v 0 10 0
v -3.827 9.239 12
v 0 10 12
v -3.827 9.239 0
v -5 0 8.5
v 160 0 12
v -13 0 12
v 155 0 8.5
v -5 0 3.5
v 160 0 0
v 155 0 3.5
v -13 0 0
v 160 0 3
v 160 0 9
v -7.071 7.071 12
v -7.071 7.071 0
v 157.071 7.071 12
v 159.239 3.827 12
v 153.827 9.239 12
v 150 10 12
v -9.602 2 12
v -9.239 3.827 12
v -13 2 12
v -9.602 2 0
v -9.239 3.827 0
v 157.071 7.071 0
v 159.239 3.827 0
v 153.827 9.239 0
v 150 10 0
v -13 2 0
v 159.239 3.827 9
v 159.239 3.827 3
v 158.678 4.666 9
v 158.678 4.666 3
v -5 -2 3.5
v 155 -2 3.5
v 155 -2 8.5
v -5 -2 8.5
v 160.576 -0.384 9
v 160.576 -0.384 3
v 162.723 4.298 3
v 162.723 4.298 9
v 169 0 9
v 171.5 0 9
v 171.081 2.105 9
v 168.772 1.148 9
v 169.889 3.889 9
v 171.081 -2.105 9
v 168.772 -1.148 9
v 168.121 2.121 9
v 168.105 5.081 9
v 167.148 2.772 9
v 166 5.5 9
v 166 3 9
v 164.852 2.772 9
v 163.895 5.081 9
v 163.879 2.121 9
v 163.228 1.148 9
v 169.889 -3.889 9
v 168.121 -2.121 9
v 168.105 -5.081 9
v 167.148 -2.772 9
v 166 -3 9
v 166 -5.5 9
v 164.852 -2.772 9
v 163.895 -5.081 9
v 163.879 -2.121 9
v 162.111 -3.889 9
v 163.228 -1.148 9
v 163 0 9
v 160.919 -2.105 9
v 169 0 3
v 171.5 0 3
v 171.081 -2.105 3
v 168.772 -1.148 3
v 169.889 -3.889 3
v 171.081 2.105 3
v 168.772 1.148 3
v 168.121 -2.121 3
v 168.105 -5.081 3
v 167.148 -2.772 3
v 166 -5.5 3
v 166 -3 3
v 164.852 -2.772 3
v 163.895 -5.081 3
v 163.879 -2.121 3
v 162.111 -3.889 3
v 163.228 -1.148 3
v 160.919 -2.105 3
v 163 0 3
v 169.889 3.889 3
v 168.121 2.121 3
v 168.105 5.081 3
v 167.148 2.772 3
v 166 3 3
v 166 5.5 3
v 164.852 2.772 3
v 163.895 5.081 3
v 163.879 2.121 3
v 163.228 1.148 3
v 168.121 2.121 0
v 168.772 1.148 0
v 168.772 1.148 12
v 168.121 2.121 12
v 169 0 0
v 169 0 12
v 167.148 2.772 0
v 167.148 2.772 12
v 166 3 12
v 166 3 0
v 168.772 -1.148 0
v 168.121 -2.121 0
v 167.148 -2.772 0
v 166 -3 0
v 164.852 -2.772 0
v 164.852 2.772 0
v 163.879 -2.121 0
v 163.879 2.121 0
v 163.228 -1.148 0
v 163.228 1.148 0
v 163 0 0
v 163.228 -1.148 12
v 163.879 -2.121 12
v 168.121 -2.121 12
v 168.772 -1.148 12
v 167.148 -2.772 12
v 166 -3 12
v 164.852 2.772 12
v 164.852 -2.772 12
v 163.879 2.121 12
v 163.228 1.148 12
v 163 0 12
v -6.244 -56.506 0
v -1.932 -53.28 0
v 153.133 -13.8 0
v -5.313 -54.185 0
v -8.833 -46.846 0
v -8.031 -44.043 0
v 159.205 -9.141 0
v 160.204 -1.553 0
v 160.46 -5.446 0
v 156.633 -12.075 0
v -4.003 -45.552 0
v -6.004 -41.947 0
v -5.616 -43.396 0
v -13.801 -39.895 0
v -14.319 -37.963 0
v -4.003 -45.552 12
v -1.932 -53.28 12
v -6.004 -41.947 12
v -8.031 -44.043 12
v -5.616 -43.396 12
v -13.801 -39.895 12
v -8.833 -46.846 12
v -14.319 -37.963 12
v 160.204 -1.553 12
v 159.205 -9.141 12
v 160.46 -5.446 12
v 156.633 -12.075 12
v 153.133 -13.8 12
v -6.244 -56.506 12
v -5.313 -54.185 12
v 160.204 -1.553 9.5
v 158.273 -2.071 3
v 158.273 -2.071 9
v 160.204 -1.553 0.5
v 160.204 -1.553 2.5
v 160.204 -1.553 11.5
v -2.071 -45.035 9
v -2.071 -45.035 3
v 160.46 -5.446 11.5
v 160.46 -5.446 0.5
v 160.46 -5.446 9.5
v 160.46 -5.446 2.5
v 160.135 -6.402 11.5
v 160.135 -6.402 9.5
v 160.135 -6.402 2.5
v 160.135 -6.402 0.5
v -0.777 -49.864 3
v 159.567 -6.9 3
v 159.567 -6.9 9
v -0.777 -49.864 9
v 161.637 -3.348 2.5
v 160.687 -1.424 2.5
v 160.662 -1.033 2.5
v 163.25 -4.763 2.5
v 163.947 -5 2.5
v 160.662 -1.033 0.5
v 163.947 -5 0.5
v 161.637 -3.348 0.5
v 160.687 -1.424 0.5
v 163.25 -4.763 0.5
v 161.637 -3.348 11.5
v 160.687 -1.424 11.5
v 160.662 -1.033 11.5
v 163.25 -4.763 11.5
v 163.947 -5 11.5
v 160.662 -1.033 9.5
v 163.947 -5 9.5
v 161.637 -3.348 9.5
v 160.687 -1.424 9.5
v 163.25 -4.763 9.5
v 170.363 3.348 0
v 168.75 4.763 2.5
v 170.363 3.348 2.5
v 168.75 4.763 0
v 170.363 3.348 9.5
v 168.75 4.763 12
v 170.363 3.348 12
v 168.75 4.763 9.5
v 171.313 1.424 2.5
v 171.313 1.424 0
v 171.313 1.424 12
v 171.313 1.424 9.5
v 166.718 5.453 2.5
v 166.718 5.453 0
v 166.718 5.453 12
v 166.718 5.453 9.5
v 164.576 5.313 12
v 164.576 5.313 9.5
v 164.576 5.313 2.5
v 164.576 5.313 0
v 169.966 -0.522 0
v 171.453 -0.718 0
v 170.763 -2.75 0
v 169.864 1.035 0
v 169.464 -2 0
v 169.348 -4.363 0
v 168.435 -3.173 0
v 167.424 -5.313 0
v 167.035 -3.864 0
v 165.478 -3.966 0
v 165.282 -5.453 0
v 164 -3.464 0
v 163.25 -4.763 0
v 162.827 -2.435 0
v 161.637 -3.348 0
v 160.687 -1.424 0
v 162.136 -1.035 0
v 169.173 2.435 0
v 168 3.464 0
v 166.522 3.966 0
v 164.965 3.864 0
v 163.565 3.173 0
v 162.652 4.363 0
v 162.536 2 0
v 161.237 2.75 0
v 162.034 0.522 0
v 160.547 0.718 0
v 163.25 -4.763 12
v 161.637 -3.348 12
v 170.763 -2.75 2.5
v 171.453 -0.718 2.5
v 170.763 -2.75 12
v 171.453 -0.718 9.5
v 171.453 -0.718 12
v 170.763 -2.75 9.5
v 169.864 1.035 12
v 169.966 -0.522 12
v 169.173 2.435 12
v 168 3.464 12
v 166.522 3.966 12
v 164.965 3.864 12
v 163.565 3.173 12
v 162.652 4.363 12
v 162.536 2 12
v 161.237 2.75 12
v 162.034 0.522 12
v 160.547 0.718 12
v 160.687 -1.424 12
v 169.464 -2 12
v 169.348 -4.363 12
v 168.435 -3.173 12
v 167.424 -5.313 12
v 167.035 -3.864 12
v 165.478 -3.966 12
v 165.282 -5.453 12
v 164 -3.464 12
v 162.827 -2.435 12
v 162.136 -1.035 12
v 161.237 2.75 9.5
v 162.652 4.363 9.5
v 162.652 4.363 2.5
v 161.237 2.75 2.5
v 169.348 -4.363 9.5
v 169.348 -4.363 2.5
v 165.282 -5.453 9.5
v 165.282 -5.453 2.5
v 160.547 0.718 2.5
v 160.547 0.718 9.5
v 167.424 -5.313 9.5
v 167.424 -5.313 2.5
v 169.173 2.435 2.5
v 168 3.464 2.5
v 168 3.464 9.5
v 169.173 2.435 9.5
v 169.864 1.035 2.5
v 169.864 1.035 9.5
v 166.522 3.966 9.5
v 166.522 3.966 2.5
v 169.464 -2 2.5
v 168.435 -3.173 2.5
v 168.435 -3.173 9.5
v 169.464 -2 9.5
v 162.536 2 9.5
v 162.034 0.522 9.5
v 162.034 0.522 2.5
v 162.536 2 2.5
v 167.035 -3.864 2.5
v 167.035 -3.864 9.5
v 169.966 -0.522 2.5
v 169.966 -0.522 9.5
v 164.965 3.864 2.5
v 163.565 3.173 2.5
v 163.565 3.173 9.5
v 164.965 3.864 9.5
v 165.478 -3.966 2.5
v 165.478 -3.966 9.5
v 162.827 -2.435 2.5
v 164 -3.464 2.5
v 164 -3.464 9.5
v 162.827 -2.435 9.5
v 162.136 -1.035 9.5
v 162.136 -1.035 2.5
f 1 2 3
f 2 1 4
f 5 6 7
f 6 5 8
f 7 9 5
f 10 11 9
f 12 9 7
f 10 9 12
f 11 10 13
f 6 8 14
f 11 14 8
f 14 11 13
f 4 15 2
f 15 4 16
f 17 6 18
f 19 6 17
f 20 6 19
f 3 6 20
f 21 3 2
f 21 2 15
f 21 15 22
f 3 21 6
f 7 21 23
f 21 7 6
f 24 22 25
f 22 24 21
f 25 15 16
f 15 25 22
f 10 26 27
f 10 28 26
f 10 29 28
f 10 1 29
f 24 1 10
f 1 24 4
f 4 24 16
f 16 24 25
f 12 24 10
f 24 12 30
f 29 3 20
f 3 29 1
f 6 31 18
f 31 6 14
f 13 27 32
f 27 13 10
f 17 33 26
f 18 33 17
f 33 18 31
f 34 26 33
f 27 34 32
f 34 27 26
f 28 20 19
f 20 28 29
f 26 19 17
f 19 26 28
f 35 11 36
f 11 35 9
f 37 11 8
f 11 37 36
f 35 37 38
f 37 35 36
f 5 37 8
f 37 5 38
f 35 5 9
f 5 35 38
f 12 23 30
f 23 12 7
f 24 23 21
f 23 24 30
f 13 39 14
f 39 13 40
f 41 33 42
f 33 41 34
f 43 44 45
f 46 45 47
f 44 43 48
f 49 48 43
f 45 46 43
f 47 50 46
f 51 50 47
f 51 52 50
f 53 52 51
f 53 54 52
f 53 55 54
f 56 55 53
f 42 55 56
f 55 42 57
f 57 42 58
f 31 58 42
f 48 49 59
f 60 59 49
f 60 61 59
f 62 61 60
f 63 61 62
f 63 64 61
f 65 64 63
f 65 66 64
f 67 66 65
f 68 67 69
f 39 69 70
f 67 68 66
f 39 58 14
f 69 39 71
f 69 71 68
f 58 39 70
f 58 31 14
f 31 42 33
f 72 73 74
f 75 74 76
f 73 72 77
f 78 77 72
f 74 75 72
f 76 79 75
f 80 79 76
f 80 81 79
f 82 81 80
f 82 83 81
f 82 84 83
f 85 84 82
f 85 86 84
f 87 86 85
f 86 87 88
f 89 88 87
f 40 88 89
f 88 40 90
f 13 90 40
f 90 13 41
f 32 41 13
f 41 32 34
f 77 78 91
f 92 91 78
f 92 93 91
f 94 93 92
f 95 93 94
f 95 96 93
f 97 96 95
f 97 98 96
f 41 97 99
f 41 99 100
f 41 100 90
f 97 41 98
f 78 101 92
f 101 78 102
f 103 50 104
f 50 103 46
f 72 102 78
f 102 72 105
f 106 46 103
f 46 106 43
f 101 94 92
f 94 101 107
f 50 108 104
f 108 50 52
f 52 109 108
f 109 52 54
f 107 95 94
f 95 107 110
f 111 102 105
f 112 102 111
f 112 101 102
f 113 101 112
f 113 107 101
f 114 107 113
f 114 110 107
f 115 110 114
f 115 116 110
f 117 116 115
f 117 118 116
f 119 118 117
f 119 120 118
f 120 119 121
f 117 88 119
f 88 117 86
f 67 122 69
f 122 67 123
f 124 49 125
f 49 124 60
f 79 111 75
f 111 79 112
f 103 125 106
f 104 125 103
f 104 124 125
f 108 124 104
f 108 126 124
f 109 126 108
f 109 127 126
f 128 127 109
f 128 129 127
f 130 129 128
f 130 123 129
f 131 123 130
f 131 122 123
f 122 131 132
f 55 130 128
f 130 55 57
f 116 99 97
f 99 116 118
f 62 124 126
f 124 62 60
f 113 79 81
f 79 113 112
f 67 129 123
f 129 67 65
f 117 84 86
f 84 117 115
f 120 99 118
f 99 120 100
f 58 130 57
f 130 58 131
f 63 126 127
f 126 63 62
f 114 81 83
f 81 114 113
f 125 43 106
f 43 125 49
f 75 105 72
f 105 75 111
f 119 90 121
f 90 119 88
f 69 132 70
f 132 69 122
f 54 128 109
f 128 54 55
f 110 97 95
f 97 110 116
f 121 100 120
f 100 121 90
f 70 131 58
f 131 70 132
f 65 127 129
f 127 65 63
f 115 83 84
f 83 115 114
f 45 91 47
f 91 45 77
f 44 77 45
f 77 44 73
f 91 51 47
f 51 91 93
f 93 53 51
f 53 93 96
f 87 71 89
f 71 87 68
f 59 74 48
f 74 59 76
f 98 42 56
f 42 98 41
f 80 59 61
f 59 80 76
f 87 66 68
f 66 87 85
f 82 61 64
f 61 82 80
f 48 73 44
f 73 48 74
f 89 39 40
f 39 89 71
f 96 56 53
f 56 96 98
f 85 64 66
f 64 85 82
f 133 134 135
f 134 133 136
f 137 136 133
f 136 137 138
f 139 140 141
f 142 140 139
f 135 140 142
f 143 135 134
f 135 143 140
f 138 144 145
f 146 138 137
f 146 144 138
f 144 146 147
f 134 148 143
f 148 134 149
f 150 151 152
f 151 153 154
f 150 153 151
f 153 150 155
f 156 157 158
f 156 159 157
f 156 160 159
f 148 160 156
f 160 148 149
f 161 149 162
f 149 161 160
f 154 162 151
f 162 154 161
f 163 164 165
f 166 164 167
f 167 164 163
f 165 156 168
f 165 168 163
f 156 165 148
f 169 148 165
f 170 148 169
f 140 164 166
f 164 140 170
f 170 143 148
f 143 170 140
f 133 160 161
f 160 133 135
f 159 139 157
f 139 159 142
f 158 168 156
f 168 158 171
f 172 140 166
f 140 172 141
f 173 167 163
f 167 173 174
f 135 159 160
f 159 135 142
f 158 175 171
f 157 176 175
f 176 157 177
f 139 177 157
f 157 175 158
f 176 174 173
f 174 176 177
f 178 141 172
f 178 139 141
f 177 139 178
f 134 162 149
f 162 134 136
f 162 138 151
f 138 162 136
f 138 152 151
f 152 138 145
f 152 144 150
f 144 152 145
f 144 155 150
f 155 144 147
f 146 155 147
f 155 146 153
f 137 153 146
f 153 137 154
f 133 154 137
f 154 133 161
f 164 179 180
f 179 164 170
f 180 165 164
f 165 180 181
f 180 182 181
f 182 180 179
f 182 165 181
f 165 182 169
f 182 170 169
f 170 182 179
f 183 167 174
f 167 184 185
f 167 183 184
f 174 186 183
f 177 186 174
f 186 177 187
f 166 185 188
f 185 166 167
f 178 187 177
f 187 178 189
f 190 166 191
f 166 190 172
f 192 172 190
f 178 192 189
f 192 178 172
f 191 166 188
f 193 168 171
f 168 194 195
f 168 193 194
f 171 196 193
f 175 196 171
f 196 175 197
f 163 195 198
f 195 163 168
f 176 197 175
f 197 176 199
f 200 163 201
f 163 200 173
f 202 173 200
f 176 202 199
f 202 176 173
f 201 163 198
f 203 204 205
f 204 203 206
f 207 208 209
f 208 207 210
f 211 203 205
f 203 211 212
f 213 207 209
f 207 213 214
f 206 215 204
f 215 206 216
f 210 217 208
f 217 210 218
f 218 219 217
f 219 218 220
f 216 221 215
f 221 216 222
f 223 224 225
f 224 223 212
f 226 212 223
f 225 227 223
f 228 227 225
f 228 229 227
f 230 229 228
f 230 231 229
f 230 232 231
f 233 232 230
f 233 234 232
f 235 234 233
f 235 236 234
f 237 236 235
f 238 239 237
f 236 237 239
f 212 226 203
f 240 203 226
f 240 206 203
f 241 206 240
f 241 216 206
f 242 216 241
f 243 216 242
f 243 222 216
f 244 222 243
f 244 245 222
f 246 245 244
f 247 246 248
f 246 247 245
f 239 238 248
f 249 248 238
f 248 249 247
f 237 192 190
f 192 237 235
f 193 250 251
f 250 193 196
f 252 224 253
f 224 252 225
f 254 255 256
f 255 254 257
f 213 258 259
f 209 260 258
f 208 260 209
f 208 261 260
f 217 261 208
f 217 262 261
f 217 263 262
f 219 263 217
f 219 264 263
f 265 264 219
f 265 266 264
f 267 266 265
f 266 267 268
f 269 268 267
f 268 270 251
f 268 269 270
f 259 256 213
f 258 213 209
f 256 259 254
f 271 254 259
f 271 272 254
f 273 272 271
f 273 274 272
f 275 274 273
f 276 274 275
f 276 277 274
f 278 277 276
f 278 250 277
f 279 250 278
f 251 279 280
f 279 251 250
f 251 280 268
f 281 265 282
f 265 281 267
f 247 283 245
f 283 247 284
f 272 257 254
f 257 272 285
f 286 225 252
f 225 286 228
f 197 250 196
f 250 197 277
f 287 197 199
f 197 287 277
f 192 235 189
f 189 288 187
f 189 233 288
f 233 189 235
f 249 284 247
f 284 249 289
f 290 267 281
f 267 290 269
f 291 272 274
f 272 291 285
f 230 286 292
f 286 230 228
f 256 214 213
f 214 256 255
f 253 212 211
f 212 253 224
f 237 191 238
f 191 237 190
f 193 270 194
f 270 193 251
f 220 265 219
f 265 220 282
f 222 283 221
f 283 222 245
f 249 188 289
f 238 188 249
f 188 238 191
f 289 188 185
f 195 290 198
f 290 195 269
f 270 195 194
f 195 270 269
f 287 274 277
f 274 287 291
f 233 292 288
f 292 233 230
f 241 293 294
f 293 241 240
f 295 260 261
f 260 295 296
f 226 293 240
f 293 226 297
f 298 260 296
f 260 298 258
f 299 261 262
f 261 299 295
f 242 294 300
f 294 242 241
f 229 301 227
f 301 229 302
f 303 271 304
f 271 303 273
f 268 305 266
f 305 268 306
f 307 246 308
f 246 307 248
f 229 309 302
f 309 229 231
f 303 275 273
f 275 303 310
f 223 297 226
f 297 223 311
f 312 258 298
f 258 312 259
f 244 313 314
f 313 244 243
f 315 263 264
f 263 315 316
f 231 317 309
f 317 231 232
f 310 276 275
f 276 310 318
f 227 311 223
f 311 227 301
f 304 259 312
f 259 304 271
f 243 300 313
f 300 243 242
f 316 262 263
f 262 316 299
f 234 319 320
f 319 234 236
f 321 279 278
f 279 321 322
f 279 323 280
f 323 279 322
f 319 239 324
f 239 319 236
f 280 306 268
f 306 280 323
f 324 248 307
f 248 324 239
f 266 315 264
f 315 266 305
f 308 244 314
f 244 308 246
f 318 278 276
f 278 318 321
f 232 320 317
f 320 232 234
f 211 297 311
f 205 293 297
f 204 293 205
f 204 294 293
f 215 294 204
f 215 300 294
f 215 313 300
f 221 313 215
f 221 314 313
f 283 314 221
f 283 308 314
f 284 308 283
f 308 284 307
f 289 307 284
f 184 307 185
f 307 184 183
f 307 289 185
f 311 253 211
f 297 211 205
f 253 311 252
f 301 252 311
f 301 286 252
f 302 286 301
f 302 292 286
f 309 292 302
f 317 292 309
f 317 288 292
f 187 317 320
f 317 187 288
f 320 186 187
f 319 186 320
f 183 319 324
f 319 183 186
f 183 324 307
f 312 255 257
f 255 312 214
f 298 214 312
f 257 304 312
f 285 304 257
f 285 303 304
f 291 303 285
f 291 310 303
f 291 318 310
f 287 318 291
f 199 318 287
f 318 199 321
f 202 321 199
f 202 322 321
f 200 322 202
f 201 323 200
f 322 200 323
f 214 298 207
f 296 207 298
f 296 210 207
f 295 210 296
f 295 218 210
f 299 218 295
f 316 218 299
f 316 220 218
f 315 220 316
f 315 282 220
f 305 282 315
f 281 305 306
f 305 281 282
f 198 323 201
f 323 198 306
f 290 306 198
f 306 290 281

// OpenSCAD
// Author: Martin Cloutier
// Email:  mxclouti@gmail.com
// Date:   2017-03-22

$fn = 16;

h = 12;
w = 20;
l = 150;

module pie(rotate_angle, radius, height) {
  linear_extrude(height) {
    rotate([0,0,rotate_angle]) 
    {
      difference() 
      {          
        circle(r=radius,center=true);
        square([radius,radius]);        
        translate([-radius,-radius,0]) square([radius*2,radius]);          
      }
    }
  }
}

module extruded_square(size,height)
{
    linear_extrude(height) square(size,center=true);    
}

module upper_part()
{   
    pie(0,w/2,h);
    translate([l/2,w/4,0]) extruded_square([l,w/2],h);
    translate([l,0,0]) pie(270,w/2,h);

    translate([0,0,h/2-h/4+0.5]) linear_extrude(h/2-1) polygon(points=[[-w/4,2],[-w/4,-2],[l+w/4,-2],[l+w/4,2]]);
    
    linear_extrude(h) polygon(points=[[-w/2+2,0],[-w/2-3,0],[-w/2-3,2],[-w/2,2],[-w/2+2,2]]);
        
    translate([l+w/2,0,h/4]) linear_extrude(h/2) polygon(points=[[0,0],[6,-4],[6,4],[-w/4,5]]);
    
    translate([l+w/2+6,0,0]) cylinder(r=3.0,h=h);       
    translate([l+w/2+6,0,h/2-(h/4)]) cylinder(r=5.5,h=h/2);       
}

module bottom_part()
{
  difference() { 
    union() 
    {
      difference() 
      {
        union() 
        {        
          translate([-w/4,-w/4,0]) extruded_square(w/2,h);
          translate([l/2,-w/4,0]) extruded_square([l,w/2],h);
          translate([l,0,0]) pie(180,w/2,h);    
          translate([-w/2,0,0]) linear_extrude(h) 
          polygon(points=[[-1,2+0.5],[-1,4],[-8,w/2],[-8,w/2-2],[-5,0],[-5,-w/2],[0,-w/2],[0,-w/2+2],[-3-0.5,-w/2+2],[-3-0.5,2.5]]);
        }      
        translate([0,0,h/2-h/4]) linear_extrude(h/2) polygon(points=[[-w/4-3,2+3],[-w/4-3,-2-3],[l+w/4+3,-2-3],[l+w/4+3,2+3]]);
      }  
      mirror([0,-1,0]) 
      {
        translate([l+w/2,0,0.5]) linear_extrude(h/4-1) polygon(points=[[0,0],[6,-4],[6,4],[-w/4,5]]);
      }
      mirror([0,-1,0]) 
      {
        translate([l+w/2,0,h/2+h/4+0.5]) linear_extrude(h/4-1) polygon(points=[[0,0],[6,-4],[6,4],[-w/4,5]]);
      }
      translate([l+w/2+6,0,0]) cylinder(r=5.5,h=h);
    }    
    translate([l+w/2+6,0,0]) cylinder(r=4.0,h=h);
    translate([l+w/2+6,0,h/4-0.5]) cylinder(r=5.5,h=h/2+1);    
  }
}

upper_part();

translate([(l+w/2+6),0,0])
rotate([0,0,15]) {
  translate([-(l+w/2+6),0,0]) 
  bottom_part();
}
